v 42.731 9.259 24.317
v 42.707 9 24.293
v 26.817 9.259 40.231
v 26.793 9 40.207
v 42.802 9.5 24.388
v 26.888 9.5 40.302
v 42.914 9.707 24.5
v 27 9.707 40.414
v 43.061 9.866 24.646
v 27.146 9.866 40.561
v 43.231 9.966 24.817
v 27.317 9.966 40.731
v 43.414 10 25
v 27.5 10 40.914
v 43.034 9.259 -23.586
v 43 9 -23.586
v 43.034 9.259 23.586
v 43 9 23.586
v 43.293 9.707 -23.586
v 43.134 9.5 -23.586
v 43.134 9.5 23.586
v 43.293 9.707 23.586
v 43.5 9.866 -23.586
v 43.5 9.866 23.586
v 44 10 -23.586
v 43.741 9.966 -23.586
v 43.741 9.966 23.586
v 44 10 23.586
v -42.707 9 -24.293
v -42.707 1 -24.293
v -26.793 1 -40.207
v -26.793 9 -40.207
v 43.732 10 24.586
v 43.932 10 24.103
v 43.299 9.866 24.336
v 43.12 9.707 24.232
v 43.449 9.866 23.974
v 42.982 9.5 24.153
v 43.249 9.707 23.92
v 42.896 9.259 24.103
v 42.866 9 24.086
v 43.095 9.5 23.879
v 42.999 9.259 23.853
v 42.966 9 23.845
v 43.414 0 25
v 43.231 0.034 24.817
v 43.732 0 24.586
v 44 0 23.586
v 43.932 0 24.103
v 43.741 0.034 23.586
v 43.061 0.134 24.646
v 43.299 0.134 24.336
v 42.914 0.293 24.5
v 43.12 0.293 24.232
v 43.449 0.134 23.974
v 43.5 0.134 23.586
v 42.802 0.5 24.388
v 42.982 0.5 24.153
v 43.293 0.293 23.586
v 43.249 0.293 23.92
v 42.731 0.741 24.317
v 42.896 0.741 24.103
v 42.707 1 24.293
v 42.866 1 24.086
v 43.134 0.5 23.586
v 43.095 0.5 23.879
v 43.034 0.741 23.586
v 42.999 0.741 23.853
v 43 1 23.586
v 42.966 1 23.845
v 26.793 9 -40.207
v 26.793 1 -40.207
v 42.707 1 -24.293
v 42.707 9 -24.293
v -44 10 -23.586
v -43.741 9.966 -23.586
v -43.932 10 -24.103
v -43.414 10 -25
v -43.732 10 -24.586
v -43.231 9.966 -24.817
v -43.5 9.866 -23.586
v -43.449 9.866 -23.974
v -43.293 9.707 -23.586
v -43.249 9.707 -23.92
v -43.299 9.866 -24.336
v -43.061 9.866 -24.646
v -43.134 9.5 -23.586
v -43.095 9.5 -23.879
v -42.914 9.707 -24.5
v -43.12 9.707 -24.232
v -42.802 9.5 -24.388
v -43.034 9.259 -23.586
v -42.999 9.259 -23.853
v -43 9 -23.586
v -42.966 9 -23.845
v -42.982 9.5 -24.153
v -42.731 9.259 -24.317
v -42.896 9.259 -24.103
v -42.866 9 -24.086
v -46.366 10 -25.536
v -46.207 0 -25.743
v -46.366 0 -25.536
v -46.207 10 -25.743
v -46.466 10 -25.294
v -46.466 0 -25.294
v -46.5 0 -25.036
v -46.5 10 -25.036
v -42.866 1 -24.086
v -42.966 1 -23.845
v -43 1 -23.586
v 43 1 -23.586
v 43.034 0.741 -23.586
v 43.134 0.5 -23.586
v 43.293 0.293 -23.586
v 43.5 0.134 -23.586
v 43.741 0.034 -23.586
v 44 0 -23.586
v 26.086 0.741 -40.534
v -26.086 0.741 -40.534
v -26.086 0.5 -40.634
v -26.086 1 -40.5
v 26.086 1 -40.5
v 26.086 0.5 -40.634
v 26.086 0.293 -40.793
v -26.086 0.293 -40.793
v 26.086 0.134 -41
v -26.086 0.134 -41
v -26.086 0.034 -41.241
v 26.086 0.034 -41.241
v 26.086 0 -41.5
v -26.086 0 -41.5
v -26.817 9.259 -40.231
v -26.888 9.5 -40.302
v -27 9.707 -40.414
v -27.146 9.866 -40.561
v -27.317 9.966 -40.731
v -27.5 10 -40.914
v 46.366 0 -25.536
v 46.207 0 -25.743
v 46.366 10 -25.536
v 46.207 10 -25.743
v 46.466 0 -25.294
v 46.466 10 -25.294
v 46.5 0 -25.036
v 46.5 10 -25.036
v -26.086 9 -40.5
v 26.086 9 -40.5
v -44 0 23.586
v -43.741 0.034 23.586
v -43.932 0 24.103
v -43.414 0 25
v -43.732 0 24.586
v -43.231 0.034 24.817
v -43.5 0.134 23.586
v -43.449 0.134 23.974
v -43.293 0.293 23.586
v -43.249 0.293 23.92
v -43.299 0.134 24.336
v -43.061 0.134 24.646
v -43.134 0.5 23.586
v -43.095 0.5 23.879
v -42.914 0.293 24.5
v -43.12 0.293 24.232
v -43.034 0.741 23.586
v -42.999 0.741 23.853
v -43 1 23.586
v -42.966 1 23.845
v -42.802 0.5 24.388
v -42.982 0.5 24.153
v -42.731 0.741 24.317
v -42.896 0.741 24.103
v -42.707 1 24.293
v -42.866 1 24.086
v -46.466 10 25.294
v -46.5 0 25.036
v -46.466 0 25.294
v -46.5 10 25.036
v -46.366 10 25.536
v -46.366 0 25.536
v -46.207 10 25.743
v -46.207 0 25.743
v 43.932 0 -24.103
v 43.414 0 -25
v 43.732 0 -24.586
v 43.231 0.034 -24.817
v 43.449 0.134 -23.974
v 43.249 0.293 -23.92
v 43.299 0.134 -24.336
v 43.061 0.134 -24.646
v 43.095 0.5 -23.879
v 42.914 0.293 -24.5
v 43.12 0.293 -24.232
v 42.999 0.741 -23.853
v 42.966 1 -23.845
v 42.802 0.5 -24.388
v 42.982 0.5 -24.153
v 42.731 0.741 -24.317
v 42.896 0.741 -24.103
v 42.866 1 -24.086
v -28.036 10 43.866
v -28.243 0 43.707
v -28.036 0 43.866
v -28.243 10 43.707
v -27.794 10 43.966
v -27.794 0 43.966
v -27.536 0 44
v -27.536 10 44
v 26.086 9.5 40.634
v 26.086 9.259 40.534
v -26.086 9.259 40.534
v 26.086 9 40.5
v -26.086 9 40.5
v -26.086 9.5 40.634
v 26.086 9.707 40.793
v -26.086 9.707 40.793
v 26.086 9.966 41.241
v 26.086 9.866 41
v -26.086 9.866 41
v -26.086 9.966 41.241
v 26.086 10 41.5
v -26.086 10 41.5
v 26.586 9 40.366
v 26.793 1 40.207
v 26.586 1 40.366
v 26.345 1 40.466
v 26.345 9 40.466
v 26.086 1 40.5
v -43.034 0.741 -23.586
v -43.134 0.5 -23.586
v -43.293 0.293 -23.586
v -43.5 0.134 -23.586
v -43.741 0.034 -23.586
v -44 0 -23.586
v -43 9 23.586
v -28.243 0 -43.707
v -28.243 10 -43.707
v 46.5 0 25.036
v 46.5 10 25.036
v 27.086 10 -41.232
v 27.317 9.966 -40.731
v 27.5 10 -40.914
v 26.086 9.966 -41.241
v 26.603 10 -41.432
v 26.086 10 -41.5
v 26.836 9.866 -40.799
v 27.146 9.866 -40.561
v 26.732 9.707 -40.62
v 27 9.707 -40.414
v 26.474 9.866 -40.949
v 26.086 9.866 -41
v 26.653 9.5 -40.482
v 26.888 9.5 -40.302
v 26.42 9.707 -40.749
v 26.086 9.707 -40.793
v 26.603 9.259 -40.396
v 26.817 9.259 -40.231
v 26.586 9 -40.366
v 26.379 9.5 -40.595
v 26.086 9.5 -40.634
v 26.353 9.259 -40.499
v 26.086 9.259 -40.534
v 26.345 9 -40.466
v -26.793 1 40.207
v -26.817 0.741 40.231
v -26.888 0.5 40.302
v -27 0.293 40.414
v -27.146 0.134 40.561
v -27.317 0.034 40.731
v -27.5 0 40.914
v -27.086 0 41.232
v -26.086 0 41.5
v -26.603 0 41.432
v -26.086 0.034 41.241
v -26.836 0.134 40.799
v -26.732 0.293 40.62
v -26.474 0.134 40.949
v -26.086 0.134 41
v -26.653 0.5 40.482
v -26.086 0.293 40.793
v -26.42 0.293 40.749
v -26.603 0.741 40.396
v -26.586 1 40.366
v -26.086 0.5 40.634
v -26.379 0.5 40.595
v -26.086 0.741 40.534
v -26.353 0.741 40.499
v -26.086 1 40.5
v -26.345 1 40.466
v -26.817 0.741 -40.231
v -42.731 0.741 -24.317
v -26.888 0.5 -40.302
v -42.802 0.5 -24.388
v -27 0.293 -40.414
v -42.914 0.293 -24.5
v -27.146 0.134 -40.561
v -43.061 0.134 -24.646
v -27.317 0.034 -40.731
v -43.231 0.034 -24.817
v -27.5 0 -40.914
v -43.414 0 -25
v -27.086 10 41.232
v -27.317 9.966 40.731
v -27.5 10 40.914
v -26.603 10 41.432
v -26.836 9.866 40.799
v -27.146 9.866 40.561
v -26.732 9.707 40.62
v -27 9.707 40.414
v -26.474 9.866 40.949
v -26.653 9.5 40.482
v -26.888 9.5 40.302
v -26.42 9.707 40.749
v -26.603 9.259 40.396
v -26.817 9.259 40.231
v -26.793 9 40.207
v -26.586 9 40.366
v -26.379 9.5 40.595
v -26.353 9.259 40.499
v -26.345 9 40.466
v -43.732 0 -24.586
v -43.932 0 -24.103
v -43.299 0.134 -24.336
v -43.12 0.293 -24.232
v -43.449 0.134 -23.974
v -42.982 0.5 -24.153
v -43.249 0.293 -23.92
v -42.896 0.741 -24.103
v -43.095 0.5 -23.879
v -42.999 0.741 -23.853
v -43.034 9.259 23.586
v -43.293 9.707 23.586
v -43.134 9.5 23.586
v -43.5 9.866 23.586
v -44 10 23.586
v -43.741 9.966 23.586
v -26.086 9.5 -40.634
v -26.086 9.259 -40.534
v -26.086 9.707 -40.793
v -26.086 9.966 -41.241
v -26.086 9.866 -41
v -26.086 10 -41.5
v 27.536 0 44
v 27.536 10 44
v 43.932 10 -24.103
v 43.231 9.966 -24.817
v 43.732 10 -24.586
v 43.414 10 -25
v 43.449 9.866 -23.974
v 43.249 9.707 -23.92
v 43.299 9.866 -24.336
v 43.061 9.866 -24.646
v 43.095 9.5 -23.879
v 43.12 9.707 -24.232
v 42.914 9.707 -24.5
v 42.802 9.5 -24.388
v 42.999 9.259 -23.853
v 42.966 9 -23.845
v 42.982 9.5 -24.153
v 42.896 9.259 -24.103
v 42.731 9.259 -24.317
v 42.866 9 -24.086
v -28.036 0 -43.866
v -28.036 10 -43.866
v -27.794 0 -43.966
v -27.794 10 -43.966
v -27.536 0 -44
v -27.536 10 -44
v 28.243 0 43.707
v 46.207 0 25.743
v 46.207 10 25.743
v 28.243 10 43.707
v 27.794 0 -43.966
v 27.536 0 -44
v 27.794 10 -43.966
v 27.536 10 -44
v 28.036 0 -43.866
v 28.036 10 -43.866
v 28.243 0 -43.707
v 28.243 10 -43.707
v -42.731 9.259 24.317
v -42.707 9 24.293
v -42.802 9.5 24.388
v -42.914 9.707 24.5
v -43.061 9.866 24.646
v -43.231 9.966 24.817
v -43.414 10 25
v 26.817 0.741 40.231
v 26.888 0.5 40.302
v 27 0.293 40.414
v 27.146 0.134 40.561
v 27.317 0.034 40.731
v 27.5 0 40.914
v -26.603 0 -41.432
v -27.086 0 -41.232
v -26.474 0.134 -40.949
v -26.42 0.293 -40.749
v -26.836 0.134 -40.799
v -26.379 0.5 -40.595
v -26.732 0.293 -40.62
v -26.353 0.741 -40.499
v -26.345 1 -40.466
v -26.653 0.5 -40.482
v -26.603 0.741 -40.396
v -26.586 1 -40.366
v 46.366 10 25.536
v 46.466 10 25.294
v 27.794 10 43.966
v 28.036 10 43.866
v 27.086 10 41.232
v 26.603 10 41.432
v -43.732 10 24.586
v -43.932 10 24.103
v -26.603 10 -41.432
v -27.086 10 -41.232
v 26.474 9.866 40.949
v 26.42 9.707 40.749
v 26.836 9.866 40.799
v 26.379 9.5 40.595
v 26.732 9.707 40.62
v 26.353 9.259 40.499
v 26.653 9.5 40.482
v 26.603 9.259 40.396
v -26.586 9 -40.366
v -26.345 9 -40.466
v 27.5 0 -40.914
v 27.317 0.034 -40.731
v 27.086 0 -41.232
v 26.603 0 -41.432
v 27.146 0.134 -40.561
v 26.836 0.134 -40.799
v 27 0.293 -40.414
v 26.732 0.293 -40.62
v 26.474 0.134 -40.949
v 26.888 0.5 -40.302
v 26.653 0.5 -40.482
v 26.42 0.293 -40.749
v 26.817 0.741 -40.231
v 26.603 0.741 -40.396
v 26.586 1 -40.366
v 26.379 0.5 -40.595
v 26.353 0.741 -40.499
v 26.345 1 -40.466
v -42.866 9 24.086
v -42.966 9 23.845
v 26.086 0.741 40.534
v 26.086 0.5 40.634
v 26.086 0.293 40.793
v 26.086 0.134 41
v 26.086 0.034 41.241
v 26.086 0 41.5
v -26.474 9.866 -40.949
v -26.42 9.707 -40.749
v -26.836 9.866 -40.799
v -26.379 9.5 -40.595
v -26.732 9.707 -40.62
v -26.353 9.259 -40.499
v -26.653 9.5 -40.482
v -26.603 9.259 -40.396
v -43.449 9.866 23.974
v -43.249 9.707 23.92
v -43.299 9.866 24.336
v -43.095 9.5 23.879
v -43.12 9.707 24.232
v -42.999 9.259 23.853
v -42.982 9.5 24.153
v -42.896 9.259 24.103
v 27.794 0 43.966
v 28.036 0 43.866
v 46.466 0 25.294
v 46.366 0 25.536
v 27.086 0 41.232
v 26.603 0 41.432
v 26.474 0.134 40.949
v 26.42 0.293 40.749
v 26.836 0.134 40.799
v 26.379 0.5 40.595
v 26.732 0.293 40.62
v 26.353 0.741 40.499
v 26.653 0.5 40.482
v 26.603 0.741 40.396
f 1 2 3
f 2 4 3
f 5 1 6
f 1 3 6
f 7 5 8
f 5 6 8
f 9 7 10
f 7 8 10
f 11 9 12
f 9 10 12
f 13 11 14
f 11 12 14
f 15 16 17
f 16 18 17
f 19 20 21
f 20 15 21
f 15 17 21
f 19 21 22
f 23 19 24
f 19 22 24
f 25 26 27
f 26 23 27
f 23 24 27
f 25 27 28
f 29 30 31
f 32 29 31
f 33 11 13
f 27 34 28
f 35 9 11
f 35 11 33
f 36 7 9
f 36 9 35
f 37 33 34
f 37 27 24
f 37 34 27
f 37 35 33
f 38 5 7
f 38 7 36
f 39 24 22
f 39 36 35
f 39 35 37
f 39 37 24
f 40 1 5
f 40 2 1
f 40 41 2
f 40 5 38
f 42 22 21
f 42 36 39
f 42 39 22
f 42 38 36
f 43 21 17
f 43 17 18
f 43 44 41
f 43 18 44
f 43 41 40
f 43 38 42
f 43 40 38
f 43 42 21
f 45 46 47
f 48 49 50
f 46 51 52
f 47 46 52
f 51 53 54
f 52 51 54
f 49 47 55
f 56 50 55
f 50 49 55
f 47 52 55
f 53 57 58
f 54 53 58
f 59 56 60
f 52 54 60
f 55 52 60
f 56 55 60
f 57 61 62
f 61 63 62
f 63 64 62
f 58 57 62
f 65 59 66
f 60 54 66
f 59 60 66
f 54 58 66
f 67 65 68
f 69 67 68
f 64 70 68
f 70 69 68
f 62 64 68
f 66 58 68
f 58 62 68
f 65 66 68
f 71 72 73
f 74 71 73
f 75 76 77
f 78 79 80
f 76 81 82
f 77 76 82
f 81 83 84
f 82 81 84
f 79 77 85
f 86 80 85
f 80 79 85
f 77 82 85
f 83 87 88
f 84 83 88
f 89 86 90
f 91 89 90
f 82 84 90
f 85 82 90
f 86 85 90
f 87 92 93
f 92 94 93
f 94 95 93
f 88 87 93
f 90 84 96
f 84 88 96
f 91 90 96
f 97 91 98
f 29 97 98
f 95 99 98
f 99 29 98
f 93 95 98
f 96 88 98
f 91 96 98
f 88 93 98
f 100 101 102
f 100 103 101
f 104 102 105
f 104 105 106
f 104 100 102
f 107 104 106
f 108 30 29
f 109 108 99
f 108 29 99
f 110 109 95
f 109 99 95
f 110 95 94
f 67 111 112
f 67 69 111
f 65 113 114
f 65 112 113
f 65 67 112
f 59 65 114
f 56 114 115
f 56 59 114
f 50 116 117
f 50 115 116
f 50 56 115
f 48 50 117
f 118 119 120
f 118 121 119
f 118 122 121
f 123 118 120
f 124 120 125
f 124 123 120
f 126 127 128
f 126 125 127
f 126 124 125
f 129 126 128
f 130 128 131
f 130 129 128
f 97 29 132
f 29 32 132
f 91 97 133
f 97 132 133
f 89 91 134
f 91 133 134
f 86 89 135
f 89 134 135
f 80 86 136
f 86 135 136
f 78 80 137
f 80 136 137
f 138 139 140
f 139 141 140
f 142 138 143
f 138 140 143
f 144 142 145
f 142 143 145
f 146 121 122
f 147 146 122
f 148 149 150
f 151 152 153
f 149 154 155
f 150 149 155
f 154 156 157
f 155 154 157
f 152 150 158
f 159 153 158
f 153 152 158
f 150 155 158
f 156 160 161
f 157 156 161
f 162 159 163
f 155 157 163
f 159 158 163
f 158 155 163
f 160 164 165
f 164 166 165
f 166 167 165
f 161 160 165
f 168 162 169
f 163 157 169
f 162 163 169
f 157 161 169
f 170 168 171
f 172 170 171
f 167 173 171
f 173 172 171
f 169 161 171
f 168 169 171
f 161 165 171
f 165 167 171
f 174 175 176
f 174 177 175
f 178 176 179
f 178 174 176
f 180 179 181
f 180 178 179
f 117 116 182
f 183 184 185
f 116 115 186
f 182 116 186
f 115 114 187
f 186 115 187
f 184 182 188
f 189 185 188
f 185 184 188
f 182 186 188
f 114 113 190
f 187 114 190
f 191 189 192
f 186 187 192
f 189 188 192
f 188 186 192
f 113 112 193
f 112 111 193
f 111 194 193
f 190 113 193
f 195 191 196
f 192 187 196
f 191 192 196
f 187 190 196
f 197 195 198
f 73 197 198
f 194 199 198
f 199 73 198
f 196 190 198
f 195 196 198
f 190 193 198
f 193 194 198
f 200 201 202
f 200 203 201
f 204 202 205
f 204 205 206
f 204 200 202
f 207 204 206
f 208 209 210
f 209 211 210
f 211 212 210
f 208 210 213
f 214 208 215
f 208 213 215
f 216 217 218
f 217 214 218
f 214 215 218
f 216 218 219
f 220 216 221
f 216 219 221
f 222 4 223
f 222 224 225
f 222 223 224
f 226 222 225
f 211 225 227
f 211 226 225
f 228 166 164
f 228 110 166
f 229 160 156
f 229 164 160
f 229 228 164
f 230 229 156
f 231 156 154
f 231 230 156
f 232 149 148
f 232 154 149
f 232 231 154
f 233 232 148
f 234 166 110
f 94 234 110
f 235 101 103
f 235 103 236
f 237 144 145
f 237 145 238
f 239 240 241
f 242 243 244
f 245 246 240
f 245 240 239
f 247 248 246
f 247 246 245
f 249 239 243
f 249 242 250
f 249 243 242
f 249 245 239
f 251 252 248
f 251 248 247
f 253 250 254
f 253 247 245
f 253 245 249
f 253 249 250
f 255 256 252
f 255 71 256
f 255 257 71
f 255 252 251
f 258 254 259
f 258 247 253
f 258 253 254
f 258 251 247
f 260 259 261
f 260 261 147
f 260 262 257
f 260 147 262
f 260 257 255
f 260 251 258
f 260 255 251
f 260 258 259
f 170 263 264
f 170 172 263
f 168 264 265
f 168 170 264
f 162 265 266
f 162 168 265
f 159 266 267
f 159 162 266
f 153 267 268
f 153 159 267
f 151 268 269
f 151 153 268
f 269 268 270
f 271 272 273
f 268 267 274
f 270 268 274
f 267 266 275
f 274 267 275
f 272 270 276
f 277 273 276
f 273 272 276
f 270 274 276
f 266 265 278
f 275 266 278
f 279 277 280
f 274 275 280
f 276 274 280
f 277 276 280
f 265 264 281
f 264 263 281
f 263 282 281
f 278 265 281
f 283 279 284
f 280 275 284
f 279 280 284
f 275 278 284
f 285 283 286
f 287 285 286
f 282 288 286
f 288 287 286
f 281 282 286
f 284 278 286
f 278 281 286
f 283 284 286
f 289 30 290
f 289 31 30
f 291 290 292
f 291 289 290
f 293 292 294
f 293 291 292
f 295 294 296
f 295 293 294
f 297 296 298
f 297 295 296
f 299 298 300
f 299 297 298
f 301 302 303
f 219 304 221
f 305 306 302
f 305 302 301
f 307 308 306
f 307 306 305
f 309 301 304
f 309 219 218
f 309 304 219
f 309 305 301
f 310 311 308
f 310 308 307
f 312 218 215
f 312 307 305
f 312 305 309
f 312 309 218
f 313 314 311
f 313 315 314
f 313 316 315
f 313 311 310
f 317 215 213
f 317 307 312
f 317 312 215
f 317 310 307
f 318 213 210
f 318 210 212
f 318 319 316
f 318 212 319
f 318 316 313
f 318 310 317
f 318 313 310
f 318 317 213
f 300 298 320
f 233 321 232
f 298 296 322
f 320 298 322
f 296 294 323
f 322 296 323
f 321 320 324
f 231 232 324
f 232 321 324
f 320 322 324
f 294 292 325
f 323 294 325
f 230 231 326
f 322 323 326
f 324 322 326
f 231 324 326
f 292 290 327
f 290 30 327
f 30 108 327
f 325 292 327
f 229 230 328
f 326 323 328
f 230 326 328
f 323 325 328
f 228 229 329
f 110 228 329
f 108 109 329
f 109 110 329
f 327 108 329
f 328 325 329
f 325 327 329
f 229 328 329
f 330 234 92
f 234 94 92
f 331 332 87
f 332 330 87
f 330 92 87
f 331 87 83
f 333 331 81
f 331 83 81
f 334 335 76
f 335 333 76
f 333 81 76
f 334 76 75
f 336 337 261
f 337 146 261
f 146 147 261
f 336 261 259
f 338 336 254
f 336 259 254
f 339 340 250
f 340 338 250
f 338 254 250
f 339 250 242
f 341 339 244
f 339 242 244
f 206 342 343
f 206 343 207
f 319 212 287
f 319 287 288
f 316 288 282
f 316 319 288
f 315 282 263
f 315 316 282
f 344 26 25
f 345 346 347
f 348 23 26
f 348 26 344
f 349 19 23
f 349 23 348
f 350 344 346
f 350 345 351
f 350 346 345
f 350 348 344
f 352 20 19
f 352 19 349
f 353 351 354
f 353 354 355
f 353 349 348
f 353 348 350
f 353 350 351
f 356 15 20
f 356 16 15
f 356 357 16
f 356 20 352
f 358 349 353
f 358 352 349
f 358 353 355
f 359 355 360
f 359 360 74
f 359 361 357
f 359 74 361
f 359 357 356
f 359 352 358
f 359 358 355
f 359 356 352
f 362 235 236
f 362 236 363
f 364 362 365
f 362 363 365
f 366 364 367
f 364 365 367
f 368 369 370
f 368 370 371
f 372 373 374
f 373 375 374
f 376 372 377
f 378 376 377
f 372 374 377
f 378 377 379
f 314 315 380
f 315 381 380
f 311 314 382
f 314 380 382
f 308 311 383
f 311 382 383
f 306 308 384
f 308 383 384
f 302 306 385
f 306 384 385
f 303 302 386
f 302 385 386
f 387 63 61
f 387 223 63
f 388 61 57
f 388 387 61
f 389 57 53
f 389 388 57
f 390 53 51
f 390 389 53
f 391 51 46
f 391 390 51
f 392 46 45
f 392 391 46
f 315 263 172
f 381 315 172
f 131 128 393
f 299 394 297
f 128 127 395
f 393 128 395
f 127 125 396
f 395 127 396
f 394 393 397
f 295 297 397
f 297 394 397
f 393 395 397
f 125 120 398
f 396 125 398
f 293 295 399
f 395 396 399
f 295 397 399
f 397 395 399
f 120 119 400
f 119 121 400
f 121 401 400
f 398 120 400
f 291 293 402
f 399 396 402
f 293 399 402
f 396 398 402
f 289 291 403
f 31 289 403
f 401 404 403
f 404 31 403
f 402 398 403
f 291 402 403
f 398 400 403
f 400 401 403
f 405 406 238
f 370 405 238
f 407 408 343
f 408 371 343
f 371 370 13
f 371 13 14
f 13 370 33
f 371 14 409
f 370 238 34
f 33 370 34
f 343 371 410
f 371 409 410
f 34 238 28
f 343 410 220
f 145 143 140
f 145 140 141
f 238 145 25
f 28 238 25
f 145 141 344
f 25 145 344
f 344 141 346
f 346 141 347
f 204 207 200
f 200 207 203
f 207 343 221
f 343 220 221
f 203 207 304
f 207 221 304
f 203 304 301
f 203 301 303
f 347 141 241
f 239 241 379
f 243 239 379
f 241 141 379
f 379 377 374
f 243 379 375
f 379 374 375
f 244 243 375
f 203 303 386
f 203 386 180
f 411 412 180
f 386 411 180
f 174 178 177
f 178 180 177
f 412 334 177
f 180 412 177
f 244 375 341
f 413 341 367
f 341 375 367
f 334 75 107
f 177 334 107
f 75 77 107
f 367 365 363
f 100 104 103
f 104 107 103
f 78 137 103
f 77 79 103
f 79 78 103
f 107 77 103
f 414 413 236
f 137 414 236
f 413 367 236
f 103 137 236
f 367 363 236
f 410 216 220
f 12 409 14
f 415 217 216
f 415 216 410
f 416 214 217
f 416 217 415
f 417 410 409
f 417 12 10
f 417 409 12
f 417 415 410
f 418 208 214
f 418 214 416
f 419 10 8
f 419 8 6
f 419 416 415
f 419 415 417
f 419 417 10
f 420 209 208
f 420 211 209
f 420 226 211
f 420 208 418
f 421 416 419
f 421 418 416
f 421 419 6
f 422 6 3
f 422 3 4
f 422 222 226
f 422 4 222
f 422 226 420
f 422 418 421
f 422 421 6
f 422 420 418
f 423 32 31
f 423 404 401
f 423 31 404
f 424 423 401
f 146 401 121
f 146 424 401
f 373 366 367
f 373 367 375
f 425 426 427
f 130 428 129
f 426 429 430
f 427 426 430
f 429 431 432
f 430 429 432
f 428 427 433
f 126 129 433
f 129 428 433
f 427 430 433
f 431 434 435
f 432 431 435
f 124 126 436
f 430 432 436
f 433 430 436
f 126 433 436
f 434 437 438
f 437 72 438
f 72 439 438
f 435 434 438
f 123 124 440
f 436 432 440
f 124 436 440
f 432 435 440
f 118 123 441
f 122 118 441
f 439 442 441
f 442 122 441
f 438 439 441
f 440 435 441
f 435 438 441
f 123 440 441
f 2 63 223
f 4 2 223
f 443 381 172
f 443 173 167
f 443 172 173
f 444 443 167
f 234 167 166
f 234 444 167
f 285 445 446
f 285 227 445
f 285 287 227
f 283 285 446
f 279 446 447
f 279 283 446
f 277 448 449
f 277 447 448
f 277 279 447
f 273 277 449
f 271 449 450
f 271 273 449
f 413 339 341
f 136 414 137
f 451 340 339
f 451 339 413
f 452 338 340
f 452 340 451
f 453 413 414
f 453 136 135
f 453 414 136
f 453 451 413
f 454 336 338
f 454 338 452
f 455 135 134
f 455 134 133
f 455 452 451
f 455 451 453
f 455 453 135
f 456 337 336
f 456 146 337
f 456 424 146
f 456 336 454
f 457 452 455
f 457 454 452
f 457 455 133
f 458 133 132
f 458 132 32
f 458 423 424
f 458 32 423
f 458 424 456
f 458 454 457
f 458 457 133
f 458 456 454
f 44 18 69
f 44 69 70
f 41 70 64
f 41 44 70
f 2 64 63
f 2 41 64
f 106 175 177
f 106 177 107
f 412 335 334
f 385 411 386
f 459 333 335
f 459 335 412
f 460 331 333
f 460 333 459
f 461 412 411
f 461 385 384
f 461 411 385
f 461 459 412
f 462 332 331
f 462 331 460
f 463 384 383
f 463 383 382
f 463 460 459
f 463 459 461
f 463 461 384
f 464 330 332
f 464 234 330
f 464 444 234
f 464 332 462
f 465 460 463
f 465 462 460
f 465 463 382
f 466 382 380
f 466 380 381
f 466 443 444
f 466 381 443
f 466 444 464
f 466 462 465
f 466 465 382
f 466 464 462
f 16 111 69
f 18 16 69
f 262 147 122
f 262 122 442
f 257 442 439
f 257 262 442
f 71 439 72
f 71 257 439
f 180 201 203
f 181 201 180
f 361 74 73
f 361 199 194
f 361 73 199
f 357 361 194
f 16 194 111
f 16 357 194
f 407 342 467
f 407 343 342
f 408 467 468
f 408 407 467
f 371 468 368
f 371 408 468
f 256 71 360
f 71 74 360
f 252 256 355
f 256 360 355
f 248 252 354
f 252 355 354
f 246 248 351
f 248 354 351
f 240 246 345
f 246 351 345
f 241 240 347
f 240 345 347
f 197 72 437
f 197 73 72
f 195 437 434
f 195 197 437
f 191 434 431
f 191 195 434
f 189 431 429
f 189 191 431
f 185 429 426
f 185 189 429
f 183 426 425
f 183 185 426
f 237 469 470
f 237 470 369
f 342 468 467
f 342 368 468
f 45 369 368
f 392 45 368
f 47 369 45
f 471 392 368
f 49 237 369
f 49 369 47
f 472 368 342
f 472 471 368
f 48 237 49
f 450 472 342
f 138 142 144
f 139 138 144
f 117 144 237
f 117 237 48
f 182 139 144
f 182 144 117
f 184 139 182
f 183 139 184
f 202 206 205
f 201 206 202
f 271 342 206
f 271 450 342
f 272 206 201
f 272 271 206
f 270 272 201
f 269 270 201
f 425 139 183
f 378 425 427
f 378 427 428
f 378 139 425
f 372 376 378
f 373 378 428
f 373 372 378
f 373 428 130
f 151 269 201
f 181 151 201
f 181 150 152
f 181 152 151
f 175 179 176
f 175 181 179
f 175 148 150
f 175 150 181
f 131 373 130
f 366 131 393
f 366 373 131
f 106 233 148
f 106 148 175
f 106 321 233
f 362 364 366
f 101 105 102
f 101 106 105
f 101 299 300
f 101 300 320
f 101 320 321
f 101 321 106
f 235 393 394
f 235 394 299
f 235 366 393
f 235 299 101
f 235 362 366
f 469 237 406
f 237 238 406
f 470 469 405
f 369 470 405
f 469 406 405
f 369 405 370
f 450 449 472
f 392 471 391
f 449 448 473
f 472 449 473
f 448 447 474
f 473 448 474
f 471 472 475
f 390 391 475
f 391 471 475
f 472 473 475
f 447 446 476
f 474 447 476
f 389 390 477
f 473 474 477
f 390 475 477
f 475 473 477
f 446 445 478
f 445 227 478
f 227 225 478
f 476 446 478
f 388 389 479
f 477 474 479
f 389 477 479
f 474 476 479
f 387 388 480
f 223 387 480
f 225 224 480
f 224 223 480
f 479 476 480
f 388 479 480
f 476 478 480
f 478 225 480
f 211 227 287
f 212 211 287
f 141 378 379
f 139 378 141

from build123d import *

# Parameters (mm, degrees)
BOSS_EXTRUDE1_DEPTH = 10
FILLET1_R           = 1


with BuildPart() as part:
    # Sketch1 → Boss-Extrude1 (new body)
    with BuildSketch(Plane(origin=(0, 0, 0), x_dir=(1, 0, 0), z_dir=(0, 1, 0))):
        Polygon((-46.5, 25.449747468), (-27.949747468, 44), (27.949747468, 44), (46.5, 25.449747468), (46.5, -25.449747468), (27.949747468, -44), (-27.949747468, -44), (-46.5, -25.449747468), align=None)
        Polygon((-43, 24), (-26.5, 40.5), (26.5, 40.5), (43, 24), (43, -24), (26.5, -40.5), (-26.5, -40.5), (-43, -24), align=None, mode=Mode.SUBTRACT)
    extrude(amount=BOSS_EXTRUDE1_DEPTH)

    # Fillet1
    fillet1_edges = [part.edges().sort_by_distance(p)[0] for p in [
        (-46.5, 5, -25.449747468),
        (-27.949747468, 5, -44),
        (27.949747468, 5, -44),
        (46.5, 5, -25.449747468),
        (46.5, 5, 25.449747468),
        (27.949747468, 5, 44),
        (-27.949747468, 5, 44),
        (-46.5, 5, 25.449747468),
        (-43, 0, 0),
        (-43, 5, -24),
        (-34.75, 0, 32.25),
        (-43, 5, 24),
        (0, 0, 40.5),
        (-26.5, 5, 40.5),
        (34.75, 0, 32.25),
        (26.5, 5, 40.5),
        (43, 0, 0),
        (43, 5, 24),
        (34.75, 0, -32.25),
        (43, 5, -24),
        (0, 0, -40.5),
        (26.5, 5, -40.5),
        (-34.75, 0, -32.25),
        (-26.5, 5, -40.5),
        (-43, 10, 0),
        (-34.75, 10, 32.25),
        (0, 10, 40.5),
        (34.75, 10, 32.25),
        (43, 10, 0),
        (34.75, 10, -32.25),
        (0, 10, -40.5),
        (-34.75, 10, -32.25),
    ]]
    fillet(fillet1_edges, radius=FILLET1_R)


solid = part.part
